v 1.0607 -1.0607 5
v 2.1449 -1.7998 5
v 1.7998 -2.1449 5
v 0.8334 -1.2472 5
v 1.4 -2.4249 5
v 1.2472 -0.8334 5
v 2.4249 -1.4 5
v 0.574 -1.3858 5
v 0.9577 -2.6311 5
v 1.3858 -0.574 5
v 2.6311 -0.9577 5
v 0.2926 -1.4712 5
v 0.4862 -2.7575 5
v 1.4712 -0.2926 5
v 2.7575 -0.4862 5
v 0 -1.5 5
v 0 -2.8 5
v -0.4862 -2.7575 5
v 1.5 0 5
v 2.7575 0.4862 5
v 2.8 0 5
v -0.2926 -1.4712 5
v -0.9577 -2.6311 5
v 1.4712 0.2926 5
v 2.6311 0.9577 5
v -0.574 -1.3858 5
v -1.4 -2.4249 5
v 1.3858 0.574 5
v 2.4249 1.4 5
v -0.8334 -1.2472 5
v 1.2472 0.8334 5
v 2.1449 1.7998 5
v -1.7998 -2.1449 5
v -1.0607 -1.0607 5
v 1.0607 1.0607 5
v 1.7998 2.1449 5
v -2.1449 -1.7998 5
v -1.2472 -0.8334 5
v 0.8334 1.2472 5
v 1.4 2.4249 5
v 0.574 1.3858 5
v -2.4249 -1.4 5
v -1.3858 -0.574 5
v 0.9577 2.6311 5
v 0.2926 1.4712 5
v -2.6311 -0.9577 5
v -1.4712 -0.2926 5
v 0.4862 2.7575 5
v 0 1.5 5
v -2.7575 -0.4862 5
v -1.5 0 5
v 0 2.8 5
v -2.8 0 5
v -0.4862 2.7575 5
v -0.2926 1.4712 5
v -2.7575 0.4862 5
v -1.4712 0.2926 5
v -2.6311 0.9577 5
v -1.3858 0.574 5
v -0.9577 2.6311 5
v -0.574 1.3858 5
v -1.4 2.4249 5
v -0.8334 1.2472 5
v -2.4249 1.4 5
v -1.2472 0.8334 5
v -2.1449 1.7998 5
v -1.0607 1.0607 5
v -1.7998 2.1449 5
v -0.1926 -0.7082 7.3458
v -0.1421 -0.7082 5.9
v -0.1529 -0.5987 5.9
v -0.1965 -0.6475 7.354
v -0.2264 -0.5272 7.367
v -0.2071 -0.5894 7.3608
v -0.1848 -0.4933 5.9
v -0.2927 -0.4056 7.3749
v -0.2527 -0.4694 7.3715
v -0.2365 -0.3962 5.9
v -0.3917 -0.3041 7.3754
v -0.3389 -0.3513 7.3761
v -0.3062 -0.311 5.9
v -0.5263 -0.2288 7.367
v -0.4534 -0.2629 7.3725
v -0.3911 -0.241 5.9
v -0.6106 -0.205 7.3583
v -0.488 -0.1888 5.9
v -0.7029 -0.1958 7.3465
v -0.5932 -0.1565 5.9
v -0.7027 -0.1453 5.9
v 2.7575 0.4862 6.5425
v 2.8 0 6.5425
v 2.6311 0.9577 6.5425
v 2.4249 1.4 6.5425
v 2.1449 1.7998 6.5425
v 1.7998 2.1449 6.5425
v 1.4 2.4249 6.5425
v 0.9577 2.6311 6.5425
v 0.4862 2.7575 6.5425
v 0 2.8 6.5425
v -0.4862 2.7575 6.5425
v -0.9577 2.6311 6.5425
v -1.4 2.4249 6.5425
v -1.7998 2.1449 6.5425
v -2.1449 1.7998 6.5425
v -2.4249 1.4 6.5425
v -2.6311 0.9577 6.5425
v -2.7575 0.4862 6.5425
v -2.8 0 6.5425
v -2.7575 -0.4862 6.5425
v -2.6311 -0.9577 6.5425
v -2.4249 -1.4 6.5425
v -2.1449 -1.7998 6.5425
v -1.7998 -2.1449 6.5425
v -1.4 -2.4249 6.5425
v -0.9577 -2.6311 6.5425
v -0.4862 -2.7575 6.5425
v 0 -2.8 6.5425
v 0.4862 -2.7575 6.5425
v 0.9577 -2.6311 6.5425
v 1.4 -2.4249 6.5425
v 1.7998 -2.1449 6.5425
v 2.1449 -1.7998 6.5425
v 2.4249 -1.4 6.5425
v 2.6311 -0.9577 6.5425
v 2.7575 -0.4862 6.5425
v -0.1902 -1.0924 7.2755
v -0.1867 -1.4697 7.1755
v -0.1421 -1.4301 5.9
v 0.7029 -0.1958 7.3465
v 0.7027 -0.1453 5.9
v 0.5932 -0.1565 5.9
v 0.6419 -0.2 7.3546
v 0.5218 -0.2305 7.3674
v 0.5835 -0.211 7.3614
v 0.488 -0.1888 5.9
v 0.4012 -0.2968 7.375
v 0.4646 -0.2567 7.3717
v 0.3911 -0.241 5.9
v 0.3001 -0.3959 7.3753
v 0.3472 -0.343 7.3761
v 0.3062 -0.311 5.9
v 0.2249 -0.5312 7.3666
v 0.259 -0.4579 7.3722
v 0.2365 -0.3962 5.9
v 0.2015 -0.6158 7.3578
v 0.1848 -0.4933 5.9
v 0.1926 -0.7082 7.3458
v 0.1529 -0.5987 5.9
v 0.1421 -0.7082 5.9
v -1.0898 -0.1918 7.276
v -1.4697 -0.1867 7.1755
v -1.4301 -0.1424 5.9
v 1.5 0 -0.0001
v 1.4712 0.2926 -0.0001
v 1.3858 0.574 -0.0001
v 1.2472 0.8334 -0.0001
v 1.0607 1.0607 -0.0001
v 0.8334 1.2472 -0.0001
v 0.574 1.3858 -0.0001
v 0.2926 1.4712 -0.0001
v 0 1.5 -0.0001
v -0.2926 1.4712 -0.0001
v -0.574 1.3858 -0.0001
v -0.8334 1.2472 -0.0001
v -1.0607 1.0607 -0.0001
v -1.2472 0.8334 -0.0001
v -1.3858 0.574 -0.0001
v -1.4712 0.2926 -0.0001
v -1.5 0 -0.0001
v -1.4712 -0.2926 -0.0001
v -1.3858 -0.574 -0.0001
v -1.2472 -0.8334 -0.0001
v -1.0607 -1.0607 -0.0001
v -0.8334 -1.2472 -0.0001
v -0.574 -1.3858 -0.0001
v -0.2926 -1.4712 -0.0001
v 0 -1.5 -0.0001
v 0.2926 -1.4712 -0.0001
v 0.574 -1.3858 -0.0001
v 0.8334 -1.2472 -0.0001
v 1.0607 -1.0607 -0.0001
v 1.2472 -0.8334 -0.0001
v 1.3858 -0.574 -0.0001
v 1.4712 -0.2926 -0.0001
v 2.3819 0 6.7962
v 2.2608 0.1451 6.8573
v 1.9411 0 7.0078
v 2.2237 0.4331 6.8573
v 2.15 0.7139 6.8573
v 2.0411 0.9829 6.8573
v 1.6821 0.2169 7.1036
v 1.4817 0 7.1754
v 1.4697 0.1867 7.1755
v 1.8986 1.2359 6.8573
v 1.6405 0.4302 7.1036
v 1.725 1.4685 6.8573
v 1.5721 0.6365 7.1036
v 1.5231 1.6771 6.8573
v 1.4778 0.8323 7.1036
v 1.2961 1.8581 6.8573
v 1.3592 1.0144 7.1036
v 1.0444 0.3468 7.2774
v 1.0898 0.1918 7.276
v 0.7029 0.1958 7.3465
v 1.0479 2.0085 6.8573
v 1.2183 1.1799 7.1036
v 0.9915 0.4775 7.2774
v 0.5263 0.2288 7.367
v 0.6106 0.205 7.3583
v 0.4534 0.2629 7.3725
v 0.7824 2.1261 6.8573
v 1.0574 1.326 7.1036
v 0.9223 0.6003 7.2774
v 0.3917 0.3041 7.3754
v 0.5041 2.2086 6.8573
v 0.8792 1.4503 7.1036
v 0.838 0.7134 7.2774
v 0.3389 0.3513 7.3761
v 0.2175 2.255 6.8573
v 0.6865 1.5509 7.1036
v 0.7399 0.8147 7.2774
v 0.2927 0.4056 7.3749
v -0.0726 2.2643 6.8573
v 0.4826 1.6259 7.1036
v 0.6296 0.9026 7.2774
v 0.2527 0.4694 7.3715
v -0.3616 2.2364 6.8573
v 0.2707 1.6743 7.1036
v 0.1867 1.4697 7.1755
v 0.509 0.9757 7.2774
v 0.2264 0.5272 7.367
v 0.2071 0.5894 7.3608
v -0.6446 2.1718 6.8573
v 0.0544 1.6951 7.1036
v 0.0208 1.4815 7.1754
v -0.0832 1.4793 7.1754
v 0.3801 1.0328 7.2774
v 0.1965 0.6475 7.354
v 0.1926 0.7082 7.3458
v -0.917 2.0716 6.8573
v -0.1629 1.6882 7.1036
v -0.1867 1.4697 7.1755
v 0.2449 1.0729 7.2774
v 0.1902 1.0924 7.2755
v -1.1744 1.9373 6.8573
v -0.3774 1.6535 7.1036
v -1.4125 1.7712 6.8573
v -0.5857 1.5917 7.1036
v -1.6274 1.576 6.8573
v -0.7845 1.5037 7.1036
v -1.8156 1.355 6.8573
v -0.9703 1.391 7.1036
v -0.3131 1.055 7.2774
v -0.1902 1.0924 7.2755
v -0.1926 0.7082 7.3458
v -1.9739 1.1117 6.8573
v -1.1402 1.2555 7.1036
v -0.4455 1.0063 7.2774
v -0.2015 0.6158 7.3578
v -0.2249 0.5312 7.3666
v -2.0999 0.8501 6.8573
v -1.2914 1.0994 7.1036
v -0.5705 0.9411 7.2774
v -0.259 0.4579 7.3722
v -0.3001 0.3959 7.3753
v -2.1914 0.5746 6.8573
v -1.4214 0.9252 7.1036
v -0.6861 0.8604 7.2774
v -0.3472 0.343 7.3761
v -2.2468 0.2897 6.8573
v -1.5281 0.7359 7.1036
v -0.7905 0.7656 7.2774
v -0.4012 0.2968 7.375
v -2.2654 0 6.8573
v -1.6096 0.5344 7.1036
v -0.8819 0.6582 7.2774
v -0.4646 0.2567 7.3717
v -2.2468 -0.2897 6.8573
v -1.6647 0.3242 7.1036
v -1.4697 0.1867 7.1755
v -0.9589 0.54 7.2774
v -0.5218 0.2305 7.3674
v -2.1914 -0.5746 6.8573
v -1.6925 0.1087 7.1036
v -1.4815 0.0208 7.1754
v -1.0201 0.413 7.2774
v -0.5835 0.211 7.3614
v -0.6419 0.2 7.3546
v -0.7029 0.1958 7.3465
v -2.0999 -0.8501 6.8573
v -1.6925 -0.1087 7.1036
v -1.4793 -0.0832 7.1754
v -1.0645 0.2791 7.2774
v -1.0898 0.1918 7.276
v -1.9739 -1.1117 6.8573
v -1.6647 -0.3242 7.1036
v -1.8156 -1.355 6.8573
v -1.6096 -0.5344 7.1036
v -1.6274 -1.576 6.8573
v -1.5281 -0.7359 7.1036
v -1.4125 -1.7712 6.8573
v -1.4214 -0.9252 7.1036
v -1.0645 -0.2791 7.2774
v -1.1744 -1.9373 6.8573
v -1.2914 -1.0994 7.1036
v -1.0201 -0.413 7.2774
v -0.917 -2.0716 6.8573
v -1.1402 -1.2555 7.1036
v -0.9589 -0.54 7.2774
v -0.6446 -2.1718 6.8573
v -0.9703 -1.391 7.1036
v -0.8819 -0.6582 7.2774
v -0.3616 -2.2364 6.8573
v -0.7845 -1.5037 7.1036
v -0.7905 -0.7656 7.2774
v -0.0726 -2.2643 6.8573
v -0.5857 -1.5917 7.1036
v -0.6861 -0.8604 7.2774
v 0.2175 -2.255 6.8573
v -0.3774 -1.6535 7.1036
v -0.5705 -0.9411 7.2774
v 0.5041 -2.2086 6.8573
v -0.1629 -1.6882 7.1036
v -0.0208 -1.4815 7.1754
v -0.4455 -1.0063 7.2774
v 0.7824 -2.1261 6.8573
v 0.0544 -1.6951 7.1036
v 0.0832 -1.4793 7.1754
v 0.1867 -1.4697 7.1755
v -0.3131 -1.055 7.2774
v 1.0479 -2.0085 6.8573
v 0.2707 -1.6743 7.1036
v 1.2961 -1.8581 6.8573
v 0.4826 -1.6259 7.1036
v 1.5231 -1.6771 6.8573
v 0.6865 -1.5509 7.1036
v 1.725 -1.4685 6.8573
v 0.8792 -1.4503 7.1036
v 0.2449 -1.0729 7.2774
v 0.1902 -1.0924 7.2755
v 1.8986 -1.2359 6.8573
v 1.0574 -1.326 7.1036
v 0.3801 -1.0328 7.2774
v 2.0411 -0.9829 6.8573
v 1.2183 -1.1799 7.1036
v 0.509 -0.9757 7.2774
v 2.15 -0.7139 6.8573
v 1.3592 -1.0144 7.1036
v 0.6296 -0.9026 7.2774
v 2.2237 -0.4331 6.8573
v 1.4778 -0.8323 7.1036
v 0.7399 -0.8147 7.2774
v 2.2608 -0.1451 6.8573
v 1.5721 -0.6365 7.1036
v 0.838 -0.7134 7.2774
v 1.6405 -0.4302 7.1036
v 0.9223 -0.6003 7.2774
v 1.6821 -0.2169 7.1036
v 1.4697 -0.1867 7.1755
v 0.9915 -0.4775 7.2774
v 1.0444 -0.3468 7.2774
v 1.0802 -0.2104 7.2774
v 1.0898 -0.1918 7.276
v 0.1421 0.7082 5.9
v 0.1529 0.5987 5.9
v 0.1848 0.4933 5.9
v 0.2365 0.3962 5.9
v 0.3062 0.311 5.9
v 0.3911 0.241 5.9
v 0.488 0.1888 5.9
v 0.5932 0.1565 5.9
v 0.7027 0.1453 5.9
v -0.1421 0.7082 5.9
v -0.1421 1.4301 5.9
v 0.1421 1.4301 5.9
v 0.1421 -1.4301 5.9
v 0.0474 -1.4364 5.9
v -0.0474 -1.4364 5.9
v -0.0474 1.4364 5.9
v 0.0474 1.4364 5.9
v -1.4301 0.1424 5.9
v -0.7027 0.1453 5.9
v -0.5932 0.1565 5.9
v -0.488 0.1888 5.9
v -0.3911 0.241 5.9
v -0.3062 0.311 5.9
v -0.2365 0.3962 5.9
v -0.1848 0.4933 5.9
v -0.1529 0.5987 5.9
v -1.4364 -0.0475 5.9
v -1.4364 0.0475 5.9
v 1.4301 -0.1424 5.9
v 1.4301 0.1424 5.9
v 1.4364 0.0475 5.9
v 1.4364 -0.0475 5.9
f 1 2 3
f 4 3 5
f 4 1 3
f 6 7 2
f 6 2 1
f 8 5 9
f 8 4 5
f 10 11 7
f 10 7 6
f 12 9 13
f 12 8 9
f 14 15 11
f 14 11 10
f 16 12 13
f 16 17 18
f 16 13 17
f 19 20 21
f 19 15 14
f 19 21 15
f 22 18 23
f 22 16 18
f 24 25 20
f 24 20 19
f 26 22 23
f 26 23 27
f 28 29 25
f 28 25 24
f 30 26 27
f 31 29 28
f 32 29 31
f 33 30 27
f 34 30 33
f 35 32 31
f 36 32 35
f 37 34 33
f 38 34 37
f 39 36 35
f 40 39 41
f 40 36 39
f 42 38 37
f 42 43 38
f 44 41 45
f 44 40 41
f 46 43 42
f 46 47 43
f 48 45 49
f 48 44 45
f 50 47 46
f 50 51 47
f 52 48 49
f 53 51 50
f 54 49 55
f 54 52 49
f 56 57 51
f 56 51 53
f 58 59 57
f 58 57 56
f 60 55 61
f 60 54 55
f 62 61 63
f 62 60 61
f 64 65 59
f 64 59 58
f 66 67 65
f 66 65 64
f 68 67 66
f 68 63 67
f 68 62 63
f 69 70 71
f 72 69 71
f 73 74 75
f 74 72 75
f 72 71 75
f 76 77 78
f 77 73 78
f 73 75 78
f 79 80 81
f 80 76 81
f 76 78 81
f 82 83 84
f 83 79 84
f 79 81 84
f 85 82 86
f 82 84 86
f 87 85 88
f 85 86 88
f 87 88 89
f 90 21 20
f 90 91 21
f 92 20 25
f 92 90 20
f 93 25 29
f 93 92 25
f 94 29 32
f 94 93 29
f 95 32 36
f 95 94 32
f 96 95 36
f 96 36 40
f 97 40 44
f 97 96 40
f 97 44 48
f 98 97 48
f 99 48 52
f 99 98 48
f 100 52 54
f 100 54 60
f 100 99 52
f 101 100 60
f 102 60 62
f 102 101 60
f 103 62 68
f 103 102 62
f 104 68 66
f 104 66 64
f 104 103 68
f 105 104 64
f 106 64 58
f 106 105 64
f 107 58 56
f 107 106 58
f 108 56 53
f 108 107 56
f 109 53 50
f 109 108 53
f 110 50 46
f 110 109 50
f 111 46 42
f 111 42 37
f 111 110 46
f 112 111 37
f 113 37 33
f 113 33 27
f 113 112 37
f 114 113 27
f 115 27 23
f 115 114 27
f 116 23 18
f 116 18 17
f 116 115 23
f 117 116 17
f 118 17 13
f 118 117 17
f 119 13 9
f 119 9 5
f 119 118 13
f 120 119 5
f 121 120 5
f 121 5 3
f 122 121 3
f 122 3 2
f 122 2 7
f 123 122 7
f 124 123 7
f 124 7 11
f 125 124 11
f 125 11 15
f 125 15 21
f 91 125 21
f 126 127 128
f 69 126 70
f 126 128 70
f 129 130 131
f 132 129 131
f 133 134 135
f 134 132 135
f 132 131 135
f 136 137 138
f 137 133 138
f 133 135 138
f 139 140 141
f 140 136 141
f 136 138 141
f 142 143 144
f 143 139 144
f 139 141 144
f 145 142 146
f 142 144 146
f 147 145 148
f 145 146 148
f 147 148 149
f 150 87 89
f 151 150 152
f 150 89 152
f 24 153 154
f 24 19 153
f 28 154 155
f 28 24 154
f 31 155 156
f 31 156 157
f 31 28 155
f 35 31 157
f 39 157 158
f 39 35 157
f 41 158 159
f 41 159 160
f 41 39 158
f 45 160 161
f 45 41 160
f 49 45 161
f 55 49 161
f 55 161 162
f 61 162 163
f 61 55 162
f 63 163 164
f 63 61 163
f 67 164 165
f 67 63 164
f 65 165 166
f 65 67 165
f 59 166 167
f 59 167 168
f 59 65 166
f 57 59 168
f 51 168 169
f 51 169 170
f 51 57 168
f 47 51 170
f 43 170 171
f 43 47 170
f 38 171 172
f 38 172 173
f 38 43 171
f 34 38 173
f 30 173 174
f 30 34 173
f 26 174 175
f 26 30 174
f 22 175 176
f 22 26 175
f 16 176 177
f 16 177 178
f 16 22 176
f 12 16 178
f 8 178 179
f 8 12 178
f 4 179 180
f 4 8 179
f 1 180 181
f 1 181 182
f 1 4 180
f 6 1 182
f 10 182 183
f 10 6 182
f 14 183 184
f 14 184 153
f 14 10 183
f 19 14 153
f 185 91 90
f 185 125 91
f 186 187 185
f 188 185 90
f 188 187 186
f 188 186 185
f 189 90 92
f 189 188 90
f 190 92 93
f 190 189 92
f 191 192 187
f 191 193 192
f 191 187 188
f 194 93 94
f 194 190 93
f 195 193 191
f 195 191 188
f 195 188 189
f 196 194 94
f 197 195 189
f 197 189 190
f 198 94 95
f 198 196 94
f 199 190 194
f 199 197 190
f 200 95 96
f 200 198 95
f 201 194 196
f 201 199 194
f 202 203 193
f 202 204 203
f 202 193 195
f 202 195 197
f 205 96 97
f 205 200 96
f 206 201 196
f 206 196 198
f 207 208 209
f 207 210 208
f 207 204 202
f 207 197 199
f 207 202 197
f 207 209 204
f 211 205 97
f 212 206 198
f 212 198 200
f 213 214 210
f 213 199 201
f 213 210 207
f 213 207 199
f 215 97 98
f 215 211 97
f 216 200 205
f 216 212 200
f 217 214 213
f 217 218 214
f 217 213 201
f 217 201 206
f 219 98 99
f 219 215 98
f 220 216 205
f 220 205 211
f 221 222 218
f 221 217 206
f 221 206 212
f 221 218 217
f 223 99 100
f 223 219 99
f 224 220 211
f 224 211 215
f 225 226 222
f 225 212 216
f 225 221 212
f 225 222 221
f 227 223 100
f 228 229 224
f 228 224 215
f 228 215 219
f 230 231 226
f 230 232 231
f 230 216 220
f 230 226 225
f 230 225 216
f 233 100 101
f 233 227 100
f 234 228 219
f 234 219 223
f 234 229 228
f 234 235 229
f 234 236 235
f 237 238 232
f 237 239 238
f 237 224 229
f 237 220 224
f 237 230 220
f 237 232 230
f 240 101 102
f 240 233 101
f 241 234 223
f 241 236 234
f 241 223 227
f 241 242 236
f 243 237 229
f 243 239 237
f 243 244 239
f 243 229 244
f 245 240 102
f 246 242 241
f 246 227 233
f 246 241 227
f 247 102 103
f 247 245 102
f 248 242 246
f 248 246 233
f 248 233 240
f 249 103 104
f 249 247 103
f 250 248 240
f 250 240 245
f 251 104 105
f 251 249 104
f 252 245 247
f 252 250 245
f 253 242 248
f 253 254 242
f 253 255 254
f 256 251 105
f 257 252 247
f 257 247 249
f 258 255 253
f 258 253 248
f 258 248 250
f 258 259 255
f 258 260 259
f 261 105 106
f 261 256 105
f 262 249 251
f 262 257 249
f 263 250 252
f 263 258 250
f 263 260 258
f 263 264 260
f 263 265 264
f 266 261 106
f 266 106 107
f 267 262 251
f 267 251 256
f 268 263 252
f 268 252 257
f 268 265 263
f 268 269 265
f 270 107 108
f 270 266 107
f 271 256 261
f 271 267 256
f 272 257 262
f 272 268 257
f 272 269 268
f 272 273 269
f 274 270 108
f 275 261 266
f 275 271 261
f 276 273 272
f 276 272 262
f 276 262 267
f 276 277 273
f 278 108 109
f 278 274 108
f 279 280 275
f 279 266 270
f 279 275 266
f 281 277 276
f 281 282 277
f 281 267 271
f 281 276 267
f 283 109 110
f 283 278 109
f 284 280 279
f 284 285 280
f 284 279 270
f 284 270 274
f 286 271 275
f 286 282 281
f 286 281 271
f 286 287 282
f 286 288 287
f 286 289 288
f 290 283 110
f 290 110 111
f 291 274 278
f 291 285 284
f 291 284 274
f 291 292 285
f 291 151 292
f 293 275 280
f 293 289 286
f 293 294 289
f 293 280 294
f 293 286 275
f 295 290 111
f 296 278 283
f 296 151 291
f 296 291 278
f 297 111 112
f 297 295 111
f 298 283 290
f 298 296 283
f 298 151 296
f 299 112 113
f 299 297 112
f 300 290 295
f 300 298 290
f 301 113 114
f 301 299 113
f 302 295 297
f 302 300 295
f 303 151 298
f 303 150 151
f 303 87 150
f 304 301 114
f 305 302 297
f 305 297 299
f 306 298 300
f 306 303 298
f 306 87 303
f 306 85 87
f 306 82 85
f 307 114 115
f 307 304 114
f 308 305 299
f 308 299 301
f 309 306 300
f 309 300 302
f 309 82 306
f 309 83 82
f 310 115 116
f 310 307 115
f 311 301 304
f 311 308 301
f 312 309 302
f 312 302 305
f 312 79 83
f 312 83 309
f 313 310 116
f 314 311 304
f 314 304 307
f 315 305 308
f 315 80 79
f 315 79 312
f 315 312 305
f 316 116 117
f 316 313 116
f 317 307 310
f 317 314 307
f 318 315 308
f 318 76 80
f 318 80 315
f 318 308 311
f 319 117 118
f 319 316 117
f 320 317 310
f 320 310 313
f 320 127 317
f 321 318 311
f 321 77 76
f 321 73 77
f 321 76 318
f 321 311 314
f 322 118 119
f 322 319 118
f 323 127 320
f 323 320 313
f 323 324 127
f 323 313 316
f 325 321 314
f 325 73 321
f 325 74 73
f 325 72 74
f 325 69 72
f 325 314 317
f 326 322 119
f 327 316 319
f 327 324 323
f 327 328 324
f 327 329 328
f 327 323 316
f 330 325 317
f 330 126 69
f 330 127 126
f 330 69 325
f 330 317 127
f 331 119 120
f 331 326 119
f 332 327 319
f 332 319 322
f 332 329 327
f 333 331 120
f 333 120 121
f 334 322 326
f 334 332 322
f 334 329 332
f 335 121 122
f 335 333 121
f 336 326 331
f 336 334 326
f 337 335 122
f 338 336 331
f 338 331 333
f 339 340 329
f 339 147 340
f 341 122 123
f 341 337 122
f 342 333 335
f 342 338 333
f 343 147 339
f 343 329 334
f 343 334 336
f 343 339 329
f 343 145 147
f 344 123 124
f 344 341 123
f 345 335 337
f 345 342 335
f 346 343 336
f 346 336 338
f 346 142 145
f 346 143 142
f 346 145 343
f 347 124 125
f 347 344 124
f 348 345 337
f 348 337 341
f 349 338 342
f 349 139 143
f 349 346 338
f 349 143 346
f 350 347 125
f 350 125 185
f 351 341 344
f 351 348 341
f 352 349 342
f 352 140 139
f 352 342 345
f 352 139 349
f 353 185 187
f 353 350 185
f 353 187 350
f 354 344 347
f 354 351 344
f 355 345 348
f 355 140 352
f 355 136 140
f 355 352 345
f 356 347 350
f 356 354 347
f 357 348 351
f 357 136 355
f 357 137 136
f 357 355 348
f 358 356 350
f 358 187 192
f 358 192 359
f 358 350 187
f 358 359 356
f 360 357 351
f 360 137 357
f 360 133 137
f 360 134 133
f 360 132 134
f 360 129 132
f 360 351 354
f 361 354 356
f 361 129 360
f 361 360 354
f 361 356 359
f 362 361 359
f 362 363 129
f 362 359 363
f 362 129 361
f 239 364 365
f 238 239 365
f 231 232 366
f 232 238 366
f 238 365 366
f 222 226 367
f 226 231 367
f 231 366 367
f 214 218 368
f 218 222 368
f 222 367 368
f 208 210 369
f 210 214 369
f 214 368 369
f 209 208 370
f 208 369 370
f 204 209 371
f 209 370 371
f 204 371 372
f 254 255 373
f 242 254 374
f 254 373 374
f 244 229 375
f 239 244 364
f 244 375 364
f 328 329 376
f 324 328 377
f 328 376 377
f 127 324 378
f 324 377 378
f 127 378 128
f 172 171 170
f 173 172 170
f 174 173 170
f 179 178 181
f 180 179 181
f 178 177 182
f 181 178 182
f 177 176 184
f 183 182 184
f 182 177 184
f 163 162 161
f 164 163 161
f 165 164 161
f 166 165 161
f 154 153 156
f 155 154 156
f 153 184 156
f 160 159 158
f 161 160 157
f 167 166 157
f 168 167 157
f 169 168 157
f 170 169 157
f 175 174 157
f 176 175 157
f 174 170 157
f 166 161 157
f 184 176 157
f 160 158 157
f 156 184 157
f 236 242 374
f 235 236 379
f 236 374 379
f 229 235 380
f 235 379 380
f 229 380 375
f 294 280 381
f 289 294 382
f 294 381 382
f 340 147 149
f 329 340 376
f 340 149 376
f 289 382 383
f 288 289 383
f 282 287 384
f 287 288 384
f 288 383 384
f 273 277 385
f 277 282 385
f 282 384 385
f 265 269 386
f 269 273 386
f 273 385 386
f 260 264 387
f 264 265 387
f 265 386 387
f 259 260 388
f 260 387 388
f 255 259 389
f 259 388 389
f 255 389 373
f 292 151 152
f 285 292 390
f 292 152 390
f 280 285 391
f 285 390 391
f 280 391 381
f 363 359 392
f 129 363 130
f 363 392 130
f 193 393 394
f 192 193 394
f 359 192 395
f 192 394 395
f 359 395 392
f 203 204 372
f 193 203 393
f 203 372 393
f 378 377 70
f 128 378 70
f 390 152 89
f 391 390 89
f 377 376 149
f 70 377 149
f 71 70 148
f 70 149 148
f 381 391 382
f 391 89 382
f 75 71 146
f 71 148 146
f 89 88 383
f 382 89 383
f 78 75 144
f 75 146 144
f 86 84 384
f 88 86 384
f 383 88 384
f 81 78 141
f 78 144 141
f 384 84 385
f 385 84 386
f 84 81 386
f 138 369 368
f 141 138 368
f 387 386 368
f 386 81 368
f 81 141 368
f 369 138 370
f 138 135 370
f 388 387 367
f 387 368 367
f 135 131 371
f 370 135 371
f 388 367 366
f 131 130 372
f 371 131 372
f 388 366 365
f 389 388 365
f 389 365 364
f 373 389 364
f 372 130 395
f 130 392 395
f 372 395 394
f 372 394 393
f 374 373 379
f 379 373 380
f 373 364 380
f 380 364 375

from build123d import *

# Parameters (mm, degrees)
SKETCH1_R               = 1.5
BASE_EXTRUDE_DEPTH      = 5
BASE_EXTRUDE_DEPTH_BACK = 0.0001
CUT_EXTRUDE1_DEPTH      = 1.799999969
CUT_EXTRUDE1_TAPER      = 2


with BuildPart() as part:
    # Sketch1 → Base-Extrude (new body, two sides)
    with BuildSketch(Plane.XY) as base_extrude_sk:
        Circle(SKETCH1_R)
    extrude(amount=BASE_EXTRUDE_DEPTH)
    extrude(base_extrude_sk.sketch, amount=-BASE_EXTRUDE_DEPTH_BACK)

    # Sketch6 → Boss-Revolve2 (revolve)
    with BuildSketch(Plane(origin=(0, 0, 0), x_dir=(1, 0, 0), z_dir=(0, 1, 0))):
        with BuildLine():
            Line((0, -5), (2.7999999, -5))
            Line((2.7999999, -5), (2.7999999, -6.54246308))
            ThreePointArc((2.7999999, -6.54246308), (1.46418655, -7.180811406), (0, -7.4))
            Line((0, -7.4), (0, -5))
        make_face()
    revolve(axis=Axis((0, 0, -0.393620135), (0, 0, 1)))

    # Sketch7 → Cut-Extrude1 (cut)
    with BuildSketch(Plane(origin=(0, 0, 7.7000001), x_dir=(-1, 0, 0), z_dir=(0, 0, -1))):
        with BuildLine():
            ThreePointArc((0.205000004, 1.48592565), (0, 1.500000013), (-0.205000004, 1.48592565))
            Line((-0.205000004, 1.48592565), (-0.205000004, 0.708178558))
            ThreePointArc((-0.205000004, 0.708178558), (-0.35072876, 0.355344481), (-0.702967546, 0.208182689))
            Line((-0.702967546, 0.208182689), (-1.48592565, 0.205000004))
            ThreePointArc((-1.48592565, 0.205000004), (-1.500000013, 0), (-1.48592565, -0.205000004))
            Line((-1.48592565, -0.205000004), (-0.702967546, -0.208182689))
            ThreePointArc((-0.702967546, -0.208182689), (-0.35072876, -0.355344481), (-0.205000004, -0.708178558))
            Line((-0.205000004, -0.708178558), (-0.205000004, -1.48592565))
            ThreePointArc((-0.205000004, -1.48592565), (0, -1.500000013), (0.205000004, -1.48592565))
            Line((0.205000004, -1.48592565), (0.205000004, -0.708178558))
            ThreePointArc((0.205000004, -0.708178558), (0.35072876, -0.355344481), (0.702967546, -0.208182689))
            Line((0.702967546, -0.208182689), (1.48592565, -0.205000004))
            ThreePointArc((1.48592565, -0.205000004), (1.500000013, 0), (1.48592565, 0.205000004))
            Line((1.48592565, 0.205000004), (0.702967546, 0.208182689))
            ThreePointArc((0.702967546, 0.208182689), (0.35072876, 0.355344481), (0.205000004, 0.708178558))
            Line((0.205000004, 0.708178558), (0.205000004, 1.48592565))
        make_face()
    extrude(amount=CUT_EXTRUDE1_DEPTH, taper=CUT_EXTRUDE1_TAPER, mode=Mode.SUBTRACT)


solid = part.part
